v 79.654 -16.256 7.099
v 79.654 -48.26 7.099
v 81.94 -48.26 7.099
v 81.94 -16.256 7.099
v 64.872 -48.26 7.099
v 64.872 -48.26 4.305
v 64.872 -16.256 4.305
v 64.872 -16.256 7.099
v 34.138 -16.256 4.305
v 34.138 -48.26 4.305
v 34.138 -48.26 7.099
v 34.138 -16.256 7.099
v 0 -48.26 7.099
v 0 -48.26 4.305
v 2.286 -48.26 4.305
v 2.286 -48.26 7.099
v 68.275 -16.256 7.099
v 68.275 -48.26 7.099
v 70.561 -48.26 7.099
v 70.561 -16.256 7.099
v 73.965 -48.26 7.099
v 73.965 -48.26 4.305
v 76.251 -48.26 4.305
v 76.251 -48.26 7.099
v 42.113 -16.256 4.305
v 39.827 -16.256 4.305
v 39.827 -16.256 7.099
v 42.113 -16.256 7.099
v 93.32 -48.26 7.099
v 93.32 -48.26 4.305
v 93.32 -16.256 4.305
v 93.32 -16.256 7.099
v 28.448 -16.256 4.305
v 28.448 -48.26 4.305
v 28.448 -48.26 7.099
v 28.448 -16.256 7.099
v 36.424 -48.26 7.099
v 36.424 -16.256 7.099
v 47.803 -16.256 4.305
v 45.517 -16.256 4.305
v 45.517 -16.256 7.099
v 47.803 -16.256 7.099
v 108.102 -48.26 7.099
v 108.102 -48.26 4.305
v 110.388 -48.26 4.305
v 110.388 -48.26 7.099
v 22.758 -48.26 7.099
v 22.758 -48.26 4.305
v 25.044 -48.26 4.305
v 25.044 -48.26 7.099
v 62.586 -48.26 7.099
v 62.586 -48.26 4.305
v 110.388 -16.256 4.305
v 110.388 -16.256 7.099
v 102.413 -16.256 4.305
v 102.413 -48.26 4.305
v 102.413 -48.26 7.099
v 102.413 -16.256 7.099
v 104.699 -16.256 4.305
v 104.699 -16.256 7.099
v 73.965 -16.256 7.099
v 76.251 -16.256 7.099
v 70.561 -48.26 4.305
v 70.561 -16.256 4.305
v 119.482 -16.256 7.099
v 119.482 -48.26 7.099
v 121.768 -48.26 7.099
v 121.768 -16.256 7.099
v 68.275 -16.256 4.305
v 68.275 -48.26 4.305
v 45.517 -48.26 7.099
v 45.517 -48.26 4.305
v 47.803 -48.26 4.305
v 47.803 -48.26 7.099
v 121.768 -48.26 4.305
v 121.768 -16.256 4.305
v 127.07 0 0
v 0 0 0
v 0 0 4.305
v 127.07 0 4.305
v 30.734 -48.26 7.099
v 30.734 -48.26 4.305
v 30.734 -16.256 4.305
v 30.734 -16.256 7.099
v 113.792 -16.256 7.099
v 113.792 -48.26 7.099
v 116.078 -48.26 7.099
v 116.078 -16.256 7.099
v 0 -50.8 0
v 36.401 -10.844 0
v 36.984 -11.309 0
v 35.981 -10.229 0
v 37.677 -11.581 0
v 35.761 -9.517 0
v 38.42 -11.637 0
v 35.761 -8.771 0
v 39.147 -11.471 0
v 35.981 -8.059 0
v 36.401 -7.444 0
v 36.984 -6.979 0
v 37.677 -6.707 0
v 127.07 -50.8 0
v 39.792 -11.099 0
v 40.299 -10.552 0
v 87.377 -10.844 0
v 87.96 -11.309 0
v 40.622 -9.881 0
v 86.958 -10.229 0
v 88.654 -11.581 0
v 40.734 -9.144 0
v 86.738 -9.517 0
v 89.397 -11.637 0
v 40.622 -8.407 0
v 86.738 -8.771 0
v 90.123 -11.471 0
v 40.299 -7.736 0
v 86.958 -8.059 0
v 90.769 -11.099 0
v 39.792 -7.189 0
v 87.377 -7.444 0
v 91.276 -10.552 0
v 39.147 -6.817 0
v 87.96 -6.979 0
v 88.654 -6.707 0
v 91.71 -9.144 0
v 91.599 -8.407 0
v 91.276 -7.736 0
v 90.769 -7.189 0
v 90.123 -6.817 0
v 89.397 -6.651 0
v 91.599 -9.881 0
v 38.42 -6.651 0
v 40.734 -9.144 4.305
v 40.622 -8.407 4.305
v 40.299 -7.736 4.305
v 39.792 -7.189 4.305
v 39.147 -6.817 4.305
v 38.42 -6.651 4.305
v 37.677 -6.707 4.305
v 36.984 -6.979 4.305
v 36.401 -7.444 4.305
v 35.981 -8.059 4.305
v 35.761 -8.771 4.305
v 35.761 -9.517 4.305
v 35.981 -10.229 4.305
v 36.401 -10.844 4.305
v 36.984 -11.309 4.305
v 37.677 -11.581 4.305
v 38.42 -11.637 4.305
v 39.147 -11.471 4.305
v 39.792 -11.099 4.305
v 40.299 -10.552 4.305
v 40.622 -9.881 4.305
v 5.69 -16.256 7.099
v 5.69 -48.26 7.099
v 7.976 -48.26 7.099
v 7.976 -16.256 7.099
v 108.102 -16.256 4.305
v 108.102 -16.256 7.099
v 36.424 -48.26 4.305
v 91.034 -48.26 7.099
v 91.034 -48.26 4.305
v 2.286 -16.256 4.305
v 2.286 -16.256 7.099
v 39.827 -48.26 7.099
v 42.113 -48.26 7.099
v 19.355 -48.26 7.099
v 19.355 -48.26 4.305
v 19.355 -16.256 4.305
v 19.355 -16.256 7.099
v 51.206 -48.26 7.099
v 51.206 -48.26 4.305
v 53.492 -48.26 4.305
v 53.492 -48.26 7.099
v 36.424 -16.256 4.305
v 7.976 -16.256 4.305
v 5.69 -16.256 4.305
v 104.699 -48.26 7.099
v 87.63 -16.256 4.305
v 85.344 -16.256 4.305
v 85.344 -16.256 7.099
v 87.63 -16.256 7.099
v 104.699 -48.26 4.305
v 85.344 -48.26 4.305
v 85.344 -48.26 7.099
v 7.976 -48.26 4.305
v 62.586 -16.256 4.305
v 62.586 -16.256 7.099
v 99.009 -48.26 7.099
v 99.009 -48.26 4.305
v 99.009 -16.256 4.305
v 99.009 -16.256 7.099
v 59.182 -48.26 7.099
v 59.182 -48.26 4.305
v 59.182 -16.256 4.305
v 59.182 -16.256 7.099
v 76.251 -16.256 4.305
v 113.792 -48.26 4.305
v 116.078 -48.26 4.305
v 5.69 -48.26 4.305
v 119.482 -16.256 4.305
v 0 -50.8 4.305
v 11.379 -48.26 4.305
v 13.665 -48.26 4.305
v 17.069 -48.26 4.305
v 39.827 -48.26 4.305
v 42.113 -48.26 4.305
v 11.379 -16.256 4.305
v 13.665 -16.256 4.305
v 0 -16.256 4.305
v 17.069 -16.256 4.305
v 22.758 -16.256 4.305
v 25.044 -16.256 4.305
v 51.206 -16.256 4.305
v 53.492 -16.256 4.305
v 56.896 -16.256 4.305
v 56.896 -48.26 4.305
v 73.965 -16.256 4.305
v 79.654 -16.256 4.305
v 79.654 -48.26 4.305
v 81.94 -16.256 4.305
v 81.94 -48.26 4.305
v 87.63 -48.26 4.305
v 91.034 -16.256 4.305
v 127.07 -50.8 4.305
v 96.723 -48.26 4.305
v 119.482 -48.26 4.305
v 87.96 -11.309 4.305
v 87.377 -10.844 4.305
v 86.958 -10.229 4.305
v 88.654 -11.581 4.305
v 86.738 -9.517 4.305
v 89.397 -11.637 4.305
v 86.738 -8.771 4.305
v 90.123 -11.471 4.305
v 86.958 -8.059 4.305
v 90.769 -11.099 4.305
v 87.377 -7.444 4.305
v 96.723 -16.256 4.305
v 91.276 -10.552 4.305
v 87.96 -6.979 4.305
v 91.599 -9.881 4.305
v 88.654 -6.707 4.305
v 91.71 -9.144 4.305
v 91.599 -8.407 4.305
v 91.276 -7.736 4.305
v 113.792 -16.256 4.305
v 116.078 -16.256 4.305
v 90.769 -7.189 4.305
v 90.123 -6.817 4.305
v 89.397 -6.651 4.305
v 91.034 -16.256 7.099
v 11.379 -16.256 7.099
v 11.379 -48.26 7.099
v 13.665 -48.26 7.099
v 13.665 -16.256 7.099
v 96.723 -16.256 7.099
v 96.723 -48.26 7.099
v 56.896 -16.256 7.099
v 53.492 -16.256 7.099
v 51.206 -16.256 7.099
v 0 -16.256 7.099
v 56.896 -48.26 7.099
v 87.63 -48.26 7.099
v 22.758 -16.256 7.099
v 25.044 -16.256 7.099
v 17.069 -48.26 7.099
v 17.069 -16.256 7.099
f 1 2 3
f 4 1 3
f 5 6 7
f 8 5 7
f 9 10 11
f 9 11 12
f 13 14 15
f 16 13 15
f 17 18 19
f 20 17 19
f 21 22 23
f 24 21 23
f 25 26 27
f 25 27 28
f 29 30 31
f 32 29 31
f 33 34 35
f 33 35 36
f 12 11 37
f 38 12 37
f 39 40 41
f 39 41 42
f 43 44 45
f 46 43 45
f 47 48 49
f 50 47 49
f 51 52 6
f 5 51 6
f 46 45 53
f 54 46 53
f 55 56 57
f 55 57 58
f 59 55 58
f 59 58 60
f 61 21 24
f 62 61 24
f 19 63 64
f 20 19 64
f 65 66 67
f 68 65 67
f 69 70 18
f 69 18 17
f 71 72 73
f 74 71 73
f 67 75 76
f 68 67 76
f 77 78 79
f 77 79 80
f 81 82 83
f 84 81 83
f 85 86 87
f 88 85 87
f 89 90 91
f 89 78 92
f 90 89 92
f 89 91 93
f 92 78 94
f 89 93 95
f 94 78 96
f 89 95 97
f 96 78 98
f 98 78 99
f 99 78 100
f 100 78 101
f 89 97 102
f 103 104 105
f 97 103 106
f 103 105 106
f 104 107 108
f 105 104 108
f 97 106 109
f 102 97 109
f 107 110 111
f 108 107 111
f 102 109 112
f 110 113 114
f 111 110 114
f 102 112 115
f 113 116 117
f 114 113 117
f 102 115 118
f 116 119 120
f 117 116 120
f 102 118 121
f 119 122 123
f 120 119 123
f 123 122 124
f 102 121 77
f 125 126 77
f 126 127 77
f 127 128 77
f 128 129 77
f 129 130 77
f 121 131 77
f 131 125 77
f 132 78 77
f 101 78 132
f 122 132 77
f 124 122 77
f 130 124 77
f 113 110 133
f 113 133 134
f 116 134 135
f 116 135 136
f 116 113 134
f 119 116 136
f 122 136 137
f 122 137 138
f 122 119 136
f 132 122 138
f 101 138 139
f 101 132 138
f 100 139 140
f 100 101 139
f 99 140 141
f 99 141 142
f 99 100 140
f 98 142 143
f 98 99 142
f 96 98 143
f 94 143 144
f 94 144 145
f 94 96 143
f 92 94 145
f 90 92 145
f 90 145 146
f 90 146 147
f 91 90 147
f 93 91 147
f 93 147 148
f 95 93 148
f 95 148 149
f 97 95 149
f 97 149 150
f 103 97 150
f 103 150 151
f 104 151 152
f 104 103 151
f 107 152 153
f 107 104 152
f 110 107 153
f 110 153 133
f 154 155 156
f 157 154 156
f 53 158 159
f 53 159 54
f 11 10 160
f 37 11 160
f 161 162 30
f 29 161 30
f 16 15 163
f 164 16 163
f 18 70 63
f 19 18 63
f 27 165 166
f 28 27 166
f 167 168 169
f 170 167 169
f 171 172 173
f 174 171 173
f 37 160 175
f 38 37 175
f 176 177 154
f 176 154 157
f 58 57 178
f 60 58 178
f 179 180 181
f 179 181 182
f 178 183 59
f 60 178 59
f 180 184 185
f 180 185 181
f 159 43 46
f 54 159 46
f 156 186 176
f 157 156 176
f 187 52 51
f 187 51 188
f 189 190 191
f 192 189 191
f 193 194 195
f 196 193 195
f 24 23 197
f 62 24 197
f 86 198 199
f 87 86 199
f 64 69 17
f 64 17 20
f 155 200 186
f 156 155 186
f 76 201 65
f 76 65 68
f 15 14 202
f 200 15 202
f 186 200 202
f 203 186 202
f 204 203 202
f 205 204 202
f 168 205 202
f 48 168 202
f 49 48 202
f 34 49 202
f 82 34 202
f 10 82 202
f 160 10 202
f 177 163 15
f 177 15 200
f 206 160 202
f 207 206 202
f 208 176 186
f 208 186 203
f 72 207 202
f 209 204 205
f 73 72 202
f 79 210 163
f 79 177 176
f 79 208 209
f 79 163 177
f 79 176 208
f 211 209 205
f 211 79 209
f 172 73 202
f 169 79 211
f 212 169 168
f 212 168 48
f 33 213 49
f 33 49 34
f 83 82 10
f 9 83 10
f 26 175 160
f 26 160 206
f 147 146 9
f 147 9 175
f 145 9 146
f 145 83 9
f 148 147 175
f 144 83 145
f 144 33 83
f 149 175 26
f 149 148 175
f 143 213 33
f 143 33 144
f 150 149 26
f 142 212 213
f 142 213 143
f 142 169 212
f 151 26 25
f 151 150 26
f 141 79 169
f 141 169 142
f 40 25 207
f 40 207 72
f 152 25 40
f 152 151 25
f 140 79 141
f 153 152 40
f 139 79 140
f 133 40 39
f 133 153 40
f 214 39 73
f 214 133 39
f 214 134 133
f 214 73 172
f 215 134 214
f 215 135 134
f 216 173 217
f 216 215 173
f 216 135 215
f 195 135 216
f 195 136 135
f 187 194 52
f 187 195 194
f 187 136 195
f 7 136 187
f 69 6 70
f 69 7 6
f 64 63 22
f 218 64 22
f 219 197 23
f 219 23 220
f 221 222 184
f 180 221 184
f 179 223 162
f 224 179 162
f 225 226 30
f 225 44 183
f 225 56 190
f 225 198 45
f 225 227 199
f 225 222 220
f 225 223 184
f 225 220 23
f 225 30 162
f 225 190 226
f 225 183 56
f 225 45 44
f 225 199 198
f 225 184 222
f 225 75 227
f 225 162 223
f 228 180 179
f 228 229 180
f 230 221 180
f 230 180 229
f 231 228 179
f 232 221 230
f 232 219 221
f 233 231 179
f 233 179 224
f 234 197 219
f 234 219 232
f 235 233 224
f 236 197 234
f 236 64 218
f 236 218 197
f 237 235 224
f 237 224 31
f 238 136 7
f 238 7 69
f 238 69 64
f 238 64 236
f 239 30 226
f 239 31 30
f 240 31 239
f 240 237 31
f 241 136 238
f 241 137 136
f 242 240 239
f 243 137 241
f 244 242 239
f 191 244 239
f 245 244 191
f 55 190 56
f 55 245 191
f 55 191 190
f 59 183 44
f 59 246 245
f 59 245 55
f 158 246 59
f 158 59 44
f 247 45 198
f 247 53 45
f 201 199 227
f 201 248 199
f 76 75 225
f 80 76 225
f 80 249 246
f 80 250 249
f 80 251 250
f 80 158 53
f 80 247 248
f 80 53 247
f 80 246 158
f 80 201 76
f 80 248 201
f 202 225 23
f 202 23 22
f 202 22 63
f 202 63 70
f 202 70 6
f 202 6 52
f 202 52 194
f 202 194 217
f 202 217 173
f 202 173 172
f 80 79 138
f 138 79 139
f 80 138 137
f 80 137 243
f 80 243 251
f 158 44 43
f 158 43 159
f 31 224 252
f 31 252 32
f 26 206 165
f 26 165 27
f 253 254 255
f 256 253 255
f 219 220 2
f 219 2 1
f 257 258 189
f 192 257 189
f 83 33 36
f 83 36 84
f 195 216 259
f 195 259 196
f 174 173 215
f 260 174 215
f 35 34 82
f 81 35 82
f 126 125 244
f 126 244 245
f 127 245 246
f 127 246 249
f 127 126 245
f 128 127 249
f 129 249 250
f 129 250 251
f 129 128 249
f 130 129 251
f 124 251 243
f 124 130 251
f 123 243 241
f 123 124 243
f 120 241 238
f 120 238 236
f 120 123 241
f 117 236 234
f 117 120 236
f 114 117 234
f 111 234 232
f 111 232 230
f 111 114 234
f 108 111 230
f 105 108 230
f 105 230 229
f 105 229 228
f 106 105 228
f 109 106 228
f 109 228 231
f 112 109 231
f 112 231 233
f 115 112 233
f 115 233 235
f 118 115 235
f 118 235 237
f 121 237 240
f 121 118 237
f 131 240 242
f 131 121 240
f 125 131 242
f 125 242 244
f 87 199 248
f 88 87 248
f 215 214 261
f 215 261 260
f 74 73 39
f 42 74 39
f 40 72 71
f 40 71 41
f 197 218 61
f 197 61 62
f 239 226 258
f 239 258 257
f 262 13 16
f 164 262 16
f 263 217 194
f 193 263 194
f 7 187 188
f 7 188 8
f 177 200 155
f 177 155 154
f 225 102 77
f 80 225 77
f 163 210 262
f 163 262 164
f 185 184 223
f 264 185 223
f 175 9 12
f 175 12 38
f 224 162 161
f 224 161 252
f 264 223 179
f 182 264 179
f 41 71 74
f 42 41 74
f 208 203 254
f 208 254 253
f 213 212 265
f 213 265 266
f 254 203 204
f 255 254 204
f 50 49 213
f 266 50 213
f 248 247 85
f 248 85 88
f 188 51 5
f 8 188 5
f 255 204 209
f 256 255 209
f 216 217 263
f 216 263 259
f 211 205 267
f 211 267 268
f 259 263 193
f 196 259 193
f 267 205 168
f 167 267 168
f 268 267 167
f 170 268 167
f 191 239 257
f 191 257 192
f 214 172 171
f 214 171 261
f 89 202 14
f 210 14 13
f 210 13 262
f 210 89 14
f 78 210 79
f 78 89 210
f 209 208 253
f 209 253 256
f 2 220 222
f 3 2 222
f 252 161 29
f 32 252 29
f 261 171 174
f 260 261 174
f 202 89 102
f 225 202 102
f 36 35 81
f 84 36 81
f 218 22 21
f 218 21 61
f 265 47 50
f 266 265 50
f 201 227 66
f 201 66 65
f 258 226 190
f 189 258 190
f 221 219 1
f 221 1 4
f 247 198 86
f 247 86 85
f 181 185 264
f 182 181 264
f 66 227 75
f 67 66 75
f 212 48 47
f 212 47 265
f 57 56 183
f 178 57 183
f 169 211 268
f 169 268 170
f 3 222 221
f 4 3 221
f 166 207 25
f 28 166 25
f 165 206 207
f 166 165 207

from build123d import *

# Parameters (mm, degrees)
F0_W     = 127.07
F0_H     = 50.8
F0_R     = 2.5
F1_DEPTH = 4.3053
F2_W     = 2.286
F2_H     = 32.004
F3_DEPTH = 2.794


with BuildPart() as f1:
    # F0 (on Top) → F1 (new body)
    with BuildSketch(Plane.XY):
        with Locations((63.535, -25.4)):
            Rectangle(F0_W, F0_H)
        with Locations((38.2335, -9.144)):
            Circle(F0_R, mode=Mode.SUBTRACT)
        with Locations((89.21, -9.144)):
            Circle(F0_R, mode=Mode.SUBTRACT)
    extrude(amount=F1_DEPTH)

    # F2 (on face) → F3 (join)
    with BuildSketch(Plane.XY.offset(4.3053)):
        with Locations((1.143, -32.258)):
            Rectangle(F2_W, F2_H)
        with Locations((6.8326, -32.258)):
            Rectangle(F2_W, F2_H)
        with Locations((12.5222, -32.258)):
            Rectangle(F2_W, F2_H)
        with Locations((18.2118, -32.258)):
            Rectangle(F2_W, F2_H)
        with Locations((23.9014, -32.258)):
            Rectangle(F2_W, F2_H)
        with Locations((29.591, -32.258)):
            Rectangle(F2_W, F2_H)
        with Locations((35.2806, -32.258)):
            Rectangle(F2_W, F2_H)
        with Locations((40.9702, -32.258)):
            Rectangle(F2_W, F2_H)
        with Locations((46.6598, -32.258)):
            Rectangle(F2_W, F2_H)
        with Locations((52.3494, -32.258)):
            Rectangle(F2_W, F2_H)
        with Locations((58.039, -32.258)):
            Rectangle(F2_W, F2_H)
        with Locations((63.7286, -32.258)):
            Rectangle(F2_W, F2_H)
        with Locations((69.4182, -32.258)):
            Rectangle(F2_W, F2_H)
        with Locations((75.1078, -32.258)):
            Rectangle(F2_W, F2_H)
        with Locations((80.7974, -32.258)):
            Rectangle(F2_W, F2_H)
        with Locations((86.487, -32.258)):
            Rectangle(F2_W, F2_H)
        with Locations((92.1766, -32.258)):
            Rectangle(F2_W, F2_H)
        with Locations((97.8662, -32.258)):
            Rectangle(F2_W, F2_H)
        with Locations((103.5558, -32.258)):
            Rectangle(F2_W, F2_H)
        with Locations((109.2454, -32.258)):
            Rectangle(F2_W, F2_H)
        with Locations((114.935, -32.258)):
            Rectangle(F2_W, F2_H)
        with Locations((120.6246, -32.258)):
            Rectangle(F2_W, F2_H)
    extrude(amount=F3_DEPTH)


solid = f1.part
